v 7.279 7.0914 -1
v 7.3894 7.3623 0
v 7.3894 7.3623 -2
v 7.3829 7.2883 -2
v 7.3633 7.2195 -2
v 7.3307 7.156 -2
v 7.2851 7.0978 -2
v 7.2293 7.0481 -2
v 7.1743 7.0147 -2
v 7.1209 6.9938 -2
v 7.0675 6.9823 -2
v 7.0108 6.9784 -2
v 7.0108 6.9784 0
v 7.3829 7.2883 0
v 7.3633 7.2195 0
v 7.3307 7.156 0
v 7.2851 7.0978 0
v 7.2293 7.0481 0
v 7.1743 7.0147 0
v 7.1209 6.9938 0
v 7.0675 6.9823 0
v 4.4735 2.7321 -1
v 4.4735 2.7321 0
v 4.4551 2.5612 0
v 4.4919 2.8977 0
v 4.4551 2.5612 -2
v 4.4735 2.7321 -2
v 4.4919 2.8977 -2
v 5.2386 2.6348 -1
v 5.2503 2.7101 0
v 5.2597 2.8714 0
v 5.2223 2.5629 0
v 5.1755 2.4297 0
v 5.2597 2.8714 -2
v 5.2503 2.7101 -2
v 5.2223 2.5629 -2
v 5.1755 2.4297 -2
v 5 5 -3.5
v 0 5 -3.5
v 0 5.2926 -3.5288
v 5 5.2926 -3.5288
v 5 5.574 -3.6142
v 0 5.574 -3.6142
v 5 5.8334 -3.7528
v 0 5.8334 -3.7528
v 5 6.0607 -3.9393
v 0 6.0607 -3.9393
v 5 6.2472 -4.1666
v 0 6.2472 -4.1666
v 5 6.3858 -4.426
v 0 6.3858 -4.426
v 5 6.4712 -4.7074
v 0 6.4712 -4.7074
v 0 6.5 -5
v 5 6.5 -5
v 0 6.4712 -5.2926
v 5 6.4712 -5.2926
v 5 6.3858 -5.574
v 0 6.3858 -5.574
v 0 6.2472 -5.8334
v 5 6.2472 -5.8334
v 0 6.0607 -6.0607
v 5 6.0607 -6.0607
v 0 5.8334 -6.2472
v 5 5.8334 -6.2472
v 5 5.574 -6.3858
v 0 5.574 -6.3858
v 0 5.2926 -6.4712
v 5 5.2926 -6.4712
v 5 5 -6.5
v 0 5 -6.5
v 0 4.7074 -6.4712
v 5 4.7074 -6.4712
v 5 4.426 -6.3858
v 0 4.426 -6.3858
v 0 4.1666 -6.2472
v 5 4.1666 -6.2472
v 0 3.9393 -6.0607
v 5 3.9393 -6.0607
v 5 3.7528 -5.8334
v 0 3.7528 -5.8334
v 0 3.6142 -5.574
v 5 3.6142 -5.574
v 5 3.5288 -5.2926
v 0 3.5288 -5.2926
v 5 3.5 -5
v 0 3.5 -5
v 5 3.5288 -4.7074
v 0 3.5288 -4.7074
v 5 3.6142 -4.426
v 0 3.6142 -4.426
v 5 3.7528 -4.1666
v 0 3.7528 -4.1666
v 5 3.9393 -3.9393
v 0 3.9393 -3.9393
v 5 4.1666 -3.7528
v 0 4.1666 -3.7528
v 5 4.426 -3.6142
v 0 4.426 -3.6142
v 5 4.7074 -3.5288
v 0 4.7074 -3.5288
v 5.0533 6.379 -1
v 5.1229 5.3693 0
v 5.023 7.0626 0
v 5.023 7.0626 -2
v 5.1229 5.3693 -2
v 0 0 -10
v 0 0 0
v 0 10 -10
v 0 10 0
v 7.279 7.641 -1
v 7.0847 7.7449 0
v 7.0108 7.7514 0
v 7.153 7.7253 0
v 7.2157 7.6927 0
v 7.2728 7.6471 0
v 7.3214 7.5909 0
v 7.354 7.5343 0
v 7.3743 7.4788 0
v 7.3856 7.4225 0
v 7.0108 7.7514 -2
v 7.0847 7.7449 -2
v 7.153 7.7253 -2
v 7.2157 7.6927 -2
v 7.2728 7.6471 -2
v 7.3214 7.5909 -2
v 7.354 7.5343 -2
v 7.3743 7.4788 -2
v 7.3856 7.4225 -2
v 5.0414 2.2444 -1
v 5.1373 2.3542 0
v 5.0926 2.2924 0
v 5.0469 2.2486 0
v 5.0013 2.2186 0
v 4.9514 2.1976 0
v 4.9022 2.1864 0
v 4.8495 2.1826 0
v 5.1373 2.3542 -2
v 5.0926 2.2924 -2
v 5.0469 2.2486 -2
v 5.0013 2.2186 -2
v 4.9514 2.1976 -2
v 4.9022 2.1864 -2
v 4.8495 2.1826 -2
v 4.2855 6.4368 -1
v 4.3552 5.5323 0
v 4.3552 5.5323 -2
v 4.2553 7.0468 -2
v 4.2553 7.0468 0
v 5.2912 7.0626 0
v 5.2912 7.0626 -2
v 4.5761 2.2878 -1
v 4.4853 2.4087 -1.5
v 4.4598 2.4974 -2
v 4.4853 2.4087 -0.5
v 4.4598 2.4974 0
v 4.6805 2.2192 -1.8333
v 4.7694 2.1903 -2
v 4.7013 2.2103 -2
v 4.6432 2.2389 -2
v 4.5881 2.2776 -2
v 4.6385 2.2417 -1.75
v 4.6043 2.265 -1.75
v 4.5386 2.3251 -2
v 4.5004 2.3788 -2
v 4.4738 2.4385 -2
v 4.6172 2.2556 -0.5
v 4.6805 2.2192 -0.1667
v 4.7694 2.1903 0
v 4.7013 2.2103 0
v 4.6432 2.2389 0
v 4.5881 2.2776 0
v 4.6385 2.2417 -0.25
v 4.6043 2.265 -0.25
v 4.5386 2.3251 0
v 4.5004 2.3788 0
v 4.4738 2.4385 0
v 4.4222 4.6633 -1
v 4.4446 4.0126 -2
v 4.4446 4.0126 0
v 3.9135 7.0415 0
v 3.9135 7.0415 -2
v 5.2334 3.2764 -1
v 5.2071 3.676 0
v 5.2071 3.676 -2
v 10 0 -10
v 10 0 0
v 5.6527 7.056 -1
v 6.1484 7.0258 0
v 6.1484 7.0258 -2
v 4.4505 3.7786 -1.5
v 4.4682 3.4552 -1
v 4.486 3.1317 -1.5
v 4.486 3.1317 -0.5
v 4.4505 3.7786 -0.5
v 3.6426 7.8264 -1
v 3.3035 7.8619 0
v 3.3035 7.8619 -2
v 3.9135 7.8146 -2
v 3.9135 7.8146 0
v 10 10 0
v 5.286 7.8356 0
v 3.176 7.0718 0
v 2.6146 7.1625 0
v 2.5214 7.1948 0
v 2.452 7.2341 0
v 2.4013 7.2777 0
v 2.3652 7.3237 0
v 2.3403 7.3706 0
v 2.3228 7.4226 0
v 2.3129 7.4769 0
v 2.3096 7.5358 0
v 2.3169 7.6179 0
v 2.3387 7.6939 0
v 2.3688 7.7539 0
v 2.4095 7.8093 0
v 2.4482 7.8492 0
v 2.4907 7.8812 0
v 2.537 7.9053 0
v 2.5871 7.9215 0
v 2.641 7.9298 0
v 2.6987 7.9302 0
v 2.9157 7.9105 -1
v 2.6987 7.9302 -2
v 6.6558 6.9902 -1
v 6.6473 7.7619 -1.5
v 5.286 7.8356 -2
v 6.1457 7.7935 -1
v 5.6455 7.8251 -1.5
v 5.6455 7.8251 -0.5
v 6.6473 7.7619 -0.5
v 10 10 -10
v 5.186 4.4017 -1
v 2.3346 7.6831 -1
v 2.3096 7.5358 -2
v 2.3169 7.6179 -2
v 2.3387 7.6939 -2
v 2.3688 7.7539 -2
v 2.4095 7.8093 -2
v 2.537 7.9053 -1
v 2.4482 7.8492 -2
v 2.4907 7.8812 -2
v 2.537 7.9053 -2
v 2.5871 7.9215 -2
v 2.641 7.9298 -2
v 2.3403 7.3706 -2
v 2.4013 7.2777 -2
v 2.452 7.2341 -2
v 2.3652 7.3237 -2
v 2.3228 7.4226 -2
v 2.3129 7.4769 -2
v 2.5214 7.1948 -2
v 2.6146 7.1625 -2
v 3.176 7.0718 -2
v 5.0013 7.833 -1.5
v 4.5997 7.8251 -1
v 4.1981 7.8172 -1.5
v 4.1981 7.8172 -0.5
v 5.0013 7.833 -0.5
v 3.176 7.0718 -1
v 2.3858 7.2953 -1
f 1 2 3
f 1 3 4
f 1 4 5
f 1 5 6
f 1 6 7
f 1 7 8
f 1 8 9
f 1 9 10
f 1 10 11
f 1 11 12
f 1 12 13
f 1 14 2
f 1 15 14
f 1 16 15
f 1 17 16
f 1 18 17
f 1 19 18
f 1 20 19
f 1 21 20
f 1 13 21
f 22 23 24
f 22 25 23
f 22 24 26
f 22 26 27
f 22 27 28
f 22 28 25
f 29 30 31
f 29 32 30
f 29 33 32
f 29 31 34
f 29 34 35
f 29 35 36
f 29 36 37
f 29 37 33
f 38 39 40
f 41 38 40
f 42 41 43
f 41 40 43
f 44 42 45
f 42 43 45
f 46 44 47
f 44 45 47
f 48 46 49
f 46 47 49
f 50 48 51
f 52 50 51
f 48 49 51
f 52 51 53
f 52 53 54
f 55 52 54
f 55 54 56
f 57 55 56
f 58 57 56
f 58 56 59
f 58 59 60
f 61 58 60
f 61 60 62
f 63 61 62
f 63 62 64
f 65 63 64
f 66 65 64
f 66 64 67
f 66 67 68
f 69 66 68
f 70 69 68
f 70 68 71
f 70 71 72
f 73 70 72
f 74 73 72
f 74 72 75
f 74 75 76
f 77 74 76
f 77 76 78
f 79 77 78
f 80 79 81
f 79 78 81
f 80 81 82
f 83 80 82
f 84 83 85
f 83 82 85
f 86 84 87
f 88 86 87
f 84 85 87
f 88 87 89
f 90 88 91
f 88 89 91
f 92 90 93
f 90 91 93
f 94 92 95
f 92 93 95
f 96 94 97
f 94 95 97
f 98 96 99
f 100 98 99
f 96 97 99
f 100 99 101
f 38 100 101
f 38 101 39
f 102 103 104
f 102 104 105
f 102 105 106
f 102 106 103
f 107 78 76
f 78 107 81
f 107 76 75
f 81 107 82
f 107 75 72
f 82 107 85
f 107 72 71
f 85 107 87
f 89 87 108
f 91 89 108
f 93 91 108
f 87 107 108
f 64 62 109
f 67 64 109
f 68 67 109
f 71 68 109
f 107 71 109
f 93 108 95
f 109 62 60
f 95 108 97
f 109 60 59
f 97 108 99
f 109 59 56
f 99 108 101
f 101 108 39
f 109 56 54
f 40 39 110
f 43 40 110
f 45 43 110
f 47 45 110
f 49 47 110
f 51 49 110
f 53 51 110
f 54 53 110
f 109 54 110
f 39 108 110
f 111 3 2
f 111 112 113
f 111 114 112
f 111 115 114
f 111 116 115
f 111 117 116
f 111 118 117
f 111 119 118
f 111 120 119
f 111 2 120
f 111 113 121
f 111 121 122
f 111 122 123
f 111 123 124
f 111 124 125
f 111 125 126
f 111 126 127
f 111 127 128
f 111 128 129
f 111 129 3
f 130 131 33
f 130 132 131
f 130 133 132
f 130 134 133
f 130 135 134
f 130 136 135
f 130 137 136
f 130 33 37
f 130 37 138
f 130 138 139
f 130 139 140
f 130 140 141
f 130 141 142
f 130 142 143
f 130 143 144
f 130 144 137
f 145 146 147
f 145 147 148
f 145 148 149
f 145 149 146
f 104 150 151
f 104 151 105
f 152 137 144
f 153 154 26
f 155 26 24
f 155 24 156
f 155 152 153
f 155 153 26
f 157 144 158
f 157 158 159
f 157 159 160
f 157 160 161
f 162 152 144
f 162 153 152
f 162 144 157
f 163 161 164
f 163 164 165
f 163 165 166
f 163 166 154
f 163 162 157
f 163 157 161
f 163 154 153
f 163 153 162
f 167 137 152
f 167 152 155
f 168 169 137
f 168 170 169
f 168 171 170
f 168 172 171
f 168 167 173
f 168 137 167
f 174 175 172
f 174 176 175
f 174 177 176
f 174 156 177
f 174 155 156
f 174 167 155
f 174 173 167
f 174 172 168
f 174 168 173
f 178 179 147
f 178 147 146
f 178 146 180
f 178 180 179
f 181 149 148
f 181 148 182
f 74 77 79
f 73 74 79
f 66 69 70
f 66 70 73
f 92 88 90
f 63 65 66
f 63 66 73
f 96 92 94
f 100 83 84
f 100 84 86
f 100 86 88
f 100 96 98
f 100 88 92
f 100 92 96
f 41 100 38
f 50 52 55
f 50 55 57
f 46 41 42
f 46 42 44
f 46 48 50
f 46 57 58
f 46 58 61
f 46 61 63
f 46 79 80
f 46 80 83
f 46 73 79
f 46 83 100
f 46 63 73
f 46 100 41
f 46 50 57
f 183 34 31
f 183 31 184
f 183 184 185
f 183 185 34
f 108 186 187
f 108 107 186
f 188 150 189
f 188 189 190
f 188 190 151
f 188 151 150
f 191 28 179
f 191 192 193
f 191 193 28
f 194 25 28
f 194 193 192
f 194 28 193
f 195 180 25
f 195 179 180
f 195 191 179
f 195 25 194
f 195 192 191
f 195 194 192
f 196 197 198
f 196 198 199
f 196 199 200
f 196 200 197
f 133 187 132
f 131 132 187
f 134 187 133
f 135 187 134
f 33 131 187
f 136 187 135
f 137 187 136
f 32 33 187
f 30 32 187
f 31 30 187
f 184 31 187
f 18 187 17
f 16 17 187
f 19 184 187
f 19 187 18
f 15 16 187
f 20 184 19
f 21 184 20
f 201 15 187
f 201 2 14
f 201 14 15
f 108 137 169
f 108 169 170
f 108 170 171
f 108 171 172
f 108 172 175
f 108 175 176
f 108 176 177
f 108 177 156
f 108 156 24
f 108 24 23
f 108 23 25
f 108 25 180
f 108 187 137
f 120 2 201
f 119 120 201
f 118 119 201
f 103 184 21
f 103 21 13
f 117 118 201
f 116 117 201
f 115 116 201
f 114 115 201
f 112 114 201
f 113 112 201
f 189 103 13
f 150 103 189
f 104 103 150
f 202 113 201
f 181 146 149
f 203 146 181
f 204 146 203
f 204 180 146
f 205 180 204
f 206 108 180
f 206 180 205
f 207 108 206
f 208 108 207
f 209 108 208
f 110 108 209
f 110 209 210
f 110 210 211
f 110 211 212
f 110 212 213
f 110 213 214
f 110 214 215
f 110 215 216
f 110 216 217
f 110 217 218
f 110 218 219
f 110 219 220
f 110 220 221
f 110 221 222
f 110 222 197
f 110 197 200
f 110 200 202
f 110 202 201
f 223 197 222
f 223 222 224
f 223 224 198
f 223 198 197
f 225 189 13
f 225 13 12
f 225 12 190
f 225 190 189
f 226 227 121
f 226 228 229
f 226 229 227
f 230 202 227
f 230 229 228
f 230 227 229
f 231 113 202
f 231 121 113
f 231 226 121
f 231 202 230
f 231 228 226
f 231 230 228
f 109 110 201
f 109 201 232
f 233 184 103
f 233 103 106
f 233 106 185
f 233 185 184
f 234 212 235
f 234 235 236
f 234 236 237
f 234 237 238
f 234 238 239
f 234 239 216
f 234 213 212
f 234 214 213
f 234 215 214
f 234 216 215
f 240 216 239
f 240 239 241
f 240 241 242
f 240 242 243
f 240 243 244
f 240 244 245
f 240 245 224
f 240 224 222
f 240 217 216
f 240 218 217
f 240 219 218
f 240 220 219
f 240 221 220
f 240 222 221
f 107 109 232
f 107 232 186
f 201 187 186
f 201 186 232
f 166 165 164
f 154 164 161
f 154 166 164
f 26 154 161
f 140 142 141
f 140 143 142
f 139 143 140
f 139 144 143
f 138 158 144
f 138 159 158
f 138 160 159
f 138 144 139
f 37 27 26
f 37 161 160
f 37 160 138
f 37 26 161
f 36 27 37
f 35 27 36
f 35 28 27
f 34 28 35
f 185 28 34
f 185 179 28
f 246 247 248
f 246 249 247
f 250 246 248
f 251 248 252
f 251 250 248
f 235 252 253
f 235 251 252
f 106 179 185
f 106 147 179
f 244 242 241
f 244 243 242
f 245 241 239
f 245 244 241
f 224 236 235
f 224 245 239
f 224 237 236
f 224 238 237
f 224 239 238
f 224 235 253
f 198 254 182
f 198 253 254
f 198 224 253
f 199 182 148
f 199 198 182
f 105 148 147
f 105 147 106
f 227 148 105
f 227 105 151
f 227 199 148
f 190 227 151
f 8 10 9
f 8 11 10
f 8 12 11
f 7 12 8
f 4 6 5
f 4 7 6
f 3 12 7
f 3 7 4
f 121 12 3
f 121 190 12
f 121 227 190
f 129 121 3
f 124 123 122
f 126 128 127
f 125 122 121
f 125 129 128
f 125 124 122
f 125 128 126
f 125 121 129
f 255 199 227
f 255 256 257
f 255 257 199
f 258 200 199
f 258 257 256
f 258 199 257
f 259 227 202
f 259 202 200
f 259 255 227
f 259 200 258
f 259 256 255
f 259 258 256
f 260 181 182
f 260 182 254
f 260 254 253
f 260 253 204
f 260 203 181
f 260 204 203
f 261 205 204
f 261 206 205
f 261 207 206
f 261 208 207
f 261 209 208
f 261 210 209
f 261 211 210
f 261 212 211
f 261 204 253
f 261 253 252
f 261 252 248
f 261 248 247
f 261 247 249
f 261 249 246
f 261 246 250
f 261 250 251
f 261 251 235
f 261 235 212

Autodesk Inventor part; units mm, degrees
ref_plane "YZ Plane" through (0, 0, 0) normal (1, 0, 0) x (0, 1, 0)
ref_plane "XZ Plane" through (0, 0, 0) normal (0, 1, 0) x (-1, 0, 0)
ref_plane "XY Plane" through (0, 0, 0) normal (0, 0, 1) x (1, 0, 0)
sketch "Sketch1" plane through (0, 0, 0) normal (1, 0, 0) x (0, 1, 0)
  line L0 (0, 0) -> (10, 0)
  line L1 (10, 0) -> (10, -10)
  line L2 (10, -10) -> (0, -10)
  line L3 (0, -10) -> (0, 0)
  dimension "d0" = 10
  dimension "d1" = 10
extrude "Extrusion1" add sketch "Sketch1" along normal blind 10
sketch "Sketch3" plane through (0, 0, 0) normal (-1, 0, 0) x (0, 0, 1)
  circle A0 centre (-5, 5) radius 1.5
  point P0 (0, 0)
extrude "Extrusion3" cut sketch "Sketch3" against normal blind 5
sketch "Sketch4" plane through (0, 0, 0) normal (0, 0, 1) x (1, 0, 0)
  line L0 (1.8731, 7.9408) -> (4.4271, 7.9408) construction
  line L1 (4.4271, 7.9408) -> (4.4271, 4.8928) construction
  line L2 (4.4271, 4.8928) -> (1.8731, 4.8928) construction
  line L3 (1.8731, 4.8928) -> (1.8731, 7.9408) construction
  spline S0 degree 2 poles (7.0108, 6.9784) (6.7321, 6.9784) (6.1484, 7.0258) knots 0 0 0 1 1 1
  spline S1 degree 2 poles (6.1484, 7.0258) (5.5857, 7.0678) (5.2912, 7.0626) knots 0 0 0 1 1 1
  line L4 (5.2912, 7.0626) -> (5.023, 7.0626)
  spline S2 degree 2 poles (5.023, 7.0626) (5.0336, 6.542) (5.1229, 5.3693) knots 0 0 0 1 1 1
  spline S3 degree 2 poles (5.1229, 5.3693) (5.2071, 4.2808) (5.2071, 3.676) knots 0 0 0 1 1 1
  spline S4 degree 2 poles (5.2071, 3.676) (5.2071, 3.5445) (5.2597, 3.0082) (5.2597, 2.8714) knots 0 0 0 1 2 2 2
  spline S5 degree 2 poles (5.2597, 2.8714) (5.2597, 2.619) (5.1755, 2.4297) knots 0 0 0 1 1 1
  spline S6 degree 2 poles (5.1755, 2.4297) (5.0704, 2.1826) (4.8495, 2.1826) knots 0 0 0 1 1 1
  spline S7 degree 2 poles (4.8495, 2.1826) (4.697, 2.1826) (4.4551, 2.3929) (4.4551, 2.5612) knots 0 0 0 1 2 2 2
  spline S8 degree 2 poles (4.4551, 2.5612) (4.4551, 2.619) (4.4919, 2.8452) (4.4919, 2.8977) knots 0 0 0 1 2 2 2
  spline S9 degree 2 poles (4.4919, 2.8977) (4.4919, 3.087) (4.4446, 3.8233) (4.4446, 4.0126) knots 0 0 0 1 2 2 2
  spline S10 degree 2 poles (4.4446, 4.0126) (4.4446, 4.5542) (4.3552, 5.5323) knots 0 0 0 1 1 1
  spline S11 degree 2 poles (4.3552, 5.5323) (4.2658, 6.584) (4.2553, 7.0468) knots 0 0 0 1 1 1
  line L5 (4.2553, 7.0468) -> (3.9135, 7.0415)
  spline S12 degree 2 poles (3.9135, 7.0415) (3.0879, 7.0415) (2.6146, 7.1625) knots 0 0 0 1 1 1
  spline S13 degree 2 poles (2.6146, 7.1625) (2.3096, 7.2414) (2.3096, 7.5358) knots 0 0 0 1 1 1
  spline S14 degree 2 poles (2.3096, 7.5358) (2.3096, 7.6936) (2.4095, 7.8093) knots 0 0 0 1 1 1
  spline S15 degree 2 poles (2.4095, 7.8093) (2.5199, 7.9408) (2.6987, 7.9302) knots 0 0 0 1 1 1
  spline S16 degree 2 poles (2.6987, 7.9302) (2.8302, 7.925) (3.3035, 7.8619) knots 0 0 0 1 1 1
  spline S17 degree 2 poles (3.3035, 7.8619) (3.6768, 7.8146) (3.9135, 7.8146) knots 0 0 0 1 1 1
  spline S18 degree 2 poles (3.9135, 7.8146) (4.1396, 7.8146) (5.0598, 7.8356) (5.286, 7.8356) knots 0 0 0 1 2 2 2
  spline S19 degree 2 poles (5.286, 7.8356) (5.5752, 7.8356) (6.7163, 7.7514) (7.0108, 7.7514) knots 0 0 0 1 2 2 2
  spline S20 degree 2 poles (7.0108, 7.7514) (7.1686, 7.7514) (7.3894, 7.5306) (7.3894, 7.3623) knots 0 0 0 1 2 2 2
  spline S21 degree 2 poles (7.3894, 7.3623) (7.3894, 7.2045) (7.1686, 6.9784) (7.0108, 6.9784) knots 0 0 0 1 2 2 2
  point P0 (0, 0)
extrude "Extrusion4" cut sketch "Sketch4" against normal blind 2
properties part number "Thymine1"
